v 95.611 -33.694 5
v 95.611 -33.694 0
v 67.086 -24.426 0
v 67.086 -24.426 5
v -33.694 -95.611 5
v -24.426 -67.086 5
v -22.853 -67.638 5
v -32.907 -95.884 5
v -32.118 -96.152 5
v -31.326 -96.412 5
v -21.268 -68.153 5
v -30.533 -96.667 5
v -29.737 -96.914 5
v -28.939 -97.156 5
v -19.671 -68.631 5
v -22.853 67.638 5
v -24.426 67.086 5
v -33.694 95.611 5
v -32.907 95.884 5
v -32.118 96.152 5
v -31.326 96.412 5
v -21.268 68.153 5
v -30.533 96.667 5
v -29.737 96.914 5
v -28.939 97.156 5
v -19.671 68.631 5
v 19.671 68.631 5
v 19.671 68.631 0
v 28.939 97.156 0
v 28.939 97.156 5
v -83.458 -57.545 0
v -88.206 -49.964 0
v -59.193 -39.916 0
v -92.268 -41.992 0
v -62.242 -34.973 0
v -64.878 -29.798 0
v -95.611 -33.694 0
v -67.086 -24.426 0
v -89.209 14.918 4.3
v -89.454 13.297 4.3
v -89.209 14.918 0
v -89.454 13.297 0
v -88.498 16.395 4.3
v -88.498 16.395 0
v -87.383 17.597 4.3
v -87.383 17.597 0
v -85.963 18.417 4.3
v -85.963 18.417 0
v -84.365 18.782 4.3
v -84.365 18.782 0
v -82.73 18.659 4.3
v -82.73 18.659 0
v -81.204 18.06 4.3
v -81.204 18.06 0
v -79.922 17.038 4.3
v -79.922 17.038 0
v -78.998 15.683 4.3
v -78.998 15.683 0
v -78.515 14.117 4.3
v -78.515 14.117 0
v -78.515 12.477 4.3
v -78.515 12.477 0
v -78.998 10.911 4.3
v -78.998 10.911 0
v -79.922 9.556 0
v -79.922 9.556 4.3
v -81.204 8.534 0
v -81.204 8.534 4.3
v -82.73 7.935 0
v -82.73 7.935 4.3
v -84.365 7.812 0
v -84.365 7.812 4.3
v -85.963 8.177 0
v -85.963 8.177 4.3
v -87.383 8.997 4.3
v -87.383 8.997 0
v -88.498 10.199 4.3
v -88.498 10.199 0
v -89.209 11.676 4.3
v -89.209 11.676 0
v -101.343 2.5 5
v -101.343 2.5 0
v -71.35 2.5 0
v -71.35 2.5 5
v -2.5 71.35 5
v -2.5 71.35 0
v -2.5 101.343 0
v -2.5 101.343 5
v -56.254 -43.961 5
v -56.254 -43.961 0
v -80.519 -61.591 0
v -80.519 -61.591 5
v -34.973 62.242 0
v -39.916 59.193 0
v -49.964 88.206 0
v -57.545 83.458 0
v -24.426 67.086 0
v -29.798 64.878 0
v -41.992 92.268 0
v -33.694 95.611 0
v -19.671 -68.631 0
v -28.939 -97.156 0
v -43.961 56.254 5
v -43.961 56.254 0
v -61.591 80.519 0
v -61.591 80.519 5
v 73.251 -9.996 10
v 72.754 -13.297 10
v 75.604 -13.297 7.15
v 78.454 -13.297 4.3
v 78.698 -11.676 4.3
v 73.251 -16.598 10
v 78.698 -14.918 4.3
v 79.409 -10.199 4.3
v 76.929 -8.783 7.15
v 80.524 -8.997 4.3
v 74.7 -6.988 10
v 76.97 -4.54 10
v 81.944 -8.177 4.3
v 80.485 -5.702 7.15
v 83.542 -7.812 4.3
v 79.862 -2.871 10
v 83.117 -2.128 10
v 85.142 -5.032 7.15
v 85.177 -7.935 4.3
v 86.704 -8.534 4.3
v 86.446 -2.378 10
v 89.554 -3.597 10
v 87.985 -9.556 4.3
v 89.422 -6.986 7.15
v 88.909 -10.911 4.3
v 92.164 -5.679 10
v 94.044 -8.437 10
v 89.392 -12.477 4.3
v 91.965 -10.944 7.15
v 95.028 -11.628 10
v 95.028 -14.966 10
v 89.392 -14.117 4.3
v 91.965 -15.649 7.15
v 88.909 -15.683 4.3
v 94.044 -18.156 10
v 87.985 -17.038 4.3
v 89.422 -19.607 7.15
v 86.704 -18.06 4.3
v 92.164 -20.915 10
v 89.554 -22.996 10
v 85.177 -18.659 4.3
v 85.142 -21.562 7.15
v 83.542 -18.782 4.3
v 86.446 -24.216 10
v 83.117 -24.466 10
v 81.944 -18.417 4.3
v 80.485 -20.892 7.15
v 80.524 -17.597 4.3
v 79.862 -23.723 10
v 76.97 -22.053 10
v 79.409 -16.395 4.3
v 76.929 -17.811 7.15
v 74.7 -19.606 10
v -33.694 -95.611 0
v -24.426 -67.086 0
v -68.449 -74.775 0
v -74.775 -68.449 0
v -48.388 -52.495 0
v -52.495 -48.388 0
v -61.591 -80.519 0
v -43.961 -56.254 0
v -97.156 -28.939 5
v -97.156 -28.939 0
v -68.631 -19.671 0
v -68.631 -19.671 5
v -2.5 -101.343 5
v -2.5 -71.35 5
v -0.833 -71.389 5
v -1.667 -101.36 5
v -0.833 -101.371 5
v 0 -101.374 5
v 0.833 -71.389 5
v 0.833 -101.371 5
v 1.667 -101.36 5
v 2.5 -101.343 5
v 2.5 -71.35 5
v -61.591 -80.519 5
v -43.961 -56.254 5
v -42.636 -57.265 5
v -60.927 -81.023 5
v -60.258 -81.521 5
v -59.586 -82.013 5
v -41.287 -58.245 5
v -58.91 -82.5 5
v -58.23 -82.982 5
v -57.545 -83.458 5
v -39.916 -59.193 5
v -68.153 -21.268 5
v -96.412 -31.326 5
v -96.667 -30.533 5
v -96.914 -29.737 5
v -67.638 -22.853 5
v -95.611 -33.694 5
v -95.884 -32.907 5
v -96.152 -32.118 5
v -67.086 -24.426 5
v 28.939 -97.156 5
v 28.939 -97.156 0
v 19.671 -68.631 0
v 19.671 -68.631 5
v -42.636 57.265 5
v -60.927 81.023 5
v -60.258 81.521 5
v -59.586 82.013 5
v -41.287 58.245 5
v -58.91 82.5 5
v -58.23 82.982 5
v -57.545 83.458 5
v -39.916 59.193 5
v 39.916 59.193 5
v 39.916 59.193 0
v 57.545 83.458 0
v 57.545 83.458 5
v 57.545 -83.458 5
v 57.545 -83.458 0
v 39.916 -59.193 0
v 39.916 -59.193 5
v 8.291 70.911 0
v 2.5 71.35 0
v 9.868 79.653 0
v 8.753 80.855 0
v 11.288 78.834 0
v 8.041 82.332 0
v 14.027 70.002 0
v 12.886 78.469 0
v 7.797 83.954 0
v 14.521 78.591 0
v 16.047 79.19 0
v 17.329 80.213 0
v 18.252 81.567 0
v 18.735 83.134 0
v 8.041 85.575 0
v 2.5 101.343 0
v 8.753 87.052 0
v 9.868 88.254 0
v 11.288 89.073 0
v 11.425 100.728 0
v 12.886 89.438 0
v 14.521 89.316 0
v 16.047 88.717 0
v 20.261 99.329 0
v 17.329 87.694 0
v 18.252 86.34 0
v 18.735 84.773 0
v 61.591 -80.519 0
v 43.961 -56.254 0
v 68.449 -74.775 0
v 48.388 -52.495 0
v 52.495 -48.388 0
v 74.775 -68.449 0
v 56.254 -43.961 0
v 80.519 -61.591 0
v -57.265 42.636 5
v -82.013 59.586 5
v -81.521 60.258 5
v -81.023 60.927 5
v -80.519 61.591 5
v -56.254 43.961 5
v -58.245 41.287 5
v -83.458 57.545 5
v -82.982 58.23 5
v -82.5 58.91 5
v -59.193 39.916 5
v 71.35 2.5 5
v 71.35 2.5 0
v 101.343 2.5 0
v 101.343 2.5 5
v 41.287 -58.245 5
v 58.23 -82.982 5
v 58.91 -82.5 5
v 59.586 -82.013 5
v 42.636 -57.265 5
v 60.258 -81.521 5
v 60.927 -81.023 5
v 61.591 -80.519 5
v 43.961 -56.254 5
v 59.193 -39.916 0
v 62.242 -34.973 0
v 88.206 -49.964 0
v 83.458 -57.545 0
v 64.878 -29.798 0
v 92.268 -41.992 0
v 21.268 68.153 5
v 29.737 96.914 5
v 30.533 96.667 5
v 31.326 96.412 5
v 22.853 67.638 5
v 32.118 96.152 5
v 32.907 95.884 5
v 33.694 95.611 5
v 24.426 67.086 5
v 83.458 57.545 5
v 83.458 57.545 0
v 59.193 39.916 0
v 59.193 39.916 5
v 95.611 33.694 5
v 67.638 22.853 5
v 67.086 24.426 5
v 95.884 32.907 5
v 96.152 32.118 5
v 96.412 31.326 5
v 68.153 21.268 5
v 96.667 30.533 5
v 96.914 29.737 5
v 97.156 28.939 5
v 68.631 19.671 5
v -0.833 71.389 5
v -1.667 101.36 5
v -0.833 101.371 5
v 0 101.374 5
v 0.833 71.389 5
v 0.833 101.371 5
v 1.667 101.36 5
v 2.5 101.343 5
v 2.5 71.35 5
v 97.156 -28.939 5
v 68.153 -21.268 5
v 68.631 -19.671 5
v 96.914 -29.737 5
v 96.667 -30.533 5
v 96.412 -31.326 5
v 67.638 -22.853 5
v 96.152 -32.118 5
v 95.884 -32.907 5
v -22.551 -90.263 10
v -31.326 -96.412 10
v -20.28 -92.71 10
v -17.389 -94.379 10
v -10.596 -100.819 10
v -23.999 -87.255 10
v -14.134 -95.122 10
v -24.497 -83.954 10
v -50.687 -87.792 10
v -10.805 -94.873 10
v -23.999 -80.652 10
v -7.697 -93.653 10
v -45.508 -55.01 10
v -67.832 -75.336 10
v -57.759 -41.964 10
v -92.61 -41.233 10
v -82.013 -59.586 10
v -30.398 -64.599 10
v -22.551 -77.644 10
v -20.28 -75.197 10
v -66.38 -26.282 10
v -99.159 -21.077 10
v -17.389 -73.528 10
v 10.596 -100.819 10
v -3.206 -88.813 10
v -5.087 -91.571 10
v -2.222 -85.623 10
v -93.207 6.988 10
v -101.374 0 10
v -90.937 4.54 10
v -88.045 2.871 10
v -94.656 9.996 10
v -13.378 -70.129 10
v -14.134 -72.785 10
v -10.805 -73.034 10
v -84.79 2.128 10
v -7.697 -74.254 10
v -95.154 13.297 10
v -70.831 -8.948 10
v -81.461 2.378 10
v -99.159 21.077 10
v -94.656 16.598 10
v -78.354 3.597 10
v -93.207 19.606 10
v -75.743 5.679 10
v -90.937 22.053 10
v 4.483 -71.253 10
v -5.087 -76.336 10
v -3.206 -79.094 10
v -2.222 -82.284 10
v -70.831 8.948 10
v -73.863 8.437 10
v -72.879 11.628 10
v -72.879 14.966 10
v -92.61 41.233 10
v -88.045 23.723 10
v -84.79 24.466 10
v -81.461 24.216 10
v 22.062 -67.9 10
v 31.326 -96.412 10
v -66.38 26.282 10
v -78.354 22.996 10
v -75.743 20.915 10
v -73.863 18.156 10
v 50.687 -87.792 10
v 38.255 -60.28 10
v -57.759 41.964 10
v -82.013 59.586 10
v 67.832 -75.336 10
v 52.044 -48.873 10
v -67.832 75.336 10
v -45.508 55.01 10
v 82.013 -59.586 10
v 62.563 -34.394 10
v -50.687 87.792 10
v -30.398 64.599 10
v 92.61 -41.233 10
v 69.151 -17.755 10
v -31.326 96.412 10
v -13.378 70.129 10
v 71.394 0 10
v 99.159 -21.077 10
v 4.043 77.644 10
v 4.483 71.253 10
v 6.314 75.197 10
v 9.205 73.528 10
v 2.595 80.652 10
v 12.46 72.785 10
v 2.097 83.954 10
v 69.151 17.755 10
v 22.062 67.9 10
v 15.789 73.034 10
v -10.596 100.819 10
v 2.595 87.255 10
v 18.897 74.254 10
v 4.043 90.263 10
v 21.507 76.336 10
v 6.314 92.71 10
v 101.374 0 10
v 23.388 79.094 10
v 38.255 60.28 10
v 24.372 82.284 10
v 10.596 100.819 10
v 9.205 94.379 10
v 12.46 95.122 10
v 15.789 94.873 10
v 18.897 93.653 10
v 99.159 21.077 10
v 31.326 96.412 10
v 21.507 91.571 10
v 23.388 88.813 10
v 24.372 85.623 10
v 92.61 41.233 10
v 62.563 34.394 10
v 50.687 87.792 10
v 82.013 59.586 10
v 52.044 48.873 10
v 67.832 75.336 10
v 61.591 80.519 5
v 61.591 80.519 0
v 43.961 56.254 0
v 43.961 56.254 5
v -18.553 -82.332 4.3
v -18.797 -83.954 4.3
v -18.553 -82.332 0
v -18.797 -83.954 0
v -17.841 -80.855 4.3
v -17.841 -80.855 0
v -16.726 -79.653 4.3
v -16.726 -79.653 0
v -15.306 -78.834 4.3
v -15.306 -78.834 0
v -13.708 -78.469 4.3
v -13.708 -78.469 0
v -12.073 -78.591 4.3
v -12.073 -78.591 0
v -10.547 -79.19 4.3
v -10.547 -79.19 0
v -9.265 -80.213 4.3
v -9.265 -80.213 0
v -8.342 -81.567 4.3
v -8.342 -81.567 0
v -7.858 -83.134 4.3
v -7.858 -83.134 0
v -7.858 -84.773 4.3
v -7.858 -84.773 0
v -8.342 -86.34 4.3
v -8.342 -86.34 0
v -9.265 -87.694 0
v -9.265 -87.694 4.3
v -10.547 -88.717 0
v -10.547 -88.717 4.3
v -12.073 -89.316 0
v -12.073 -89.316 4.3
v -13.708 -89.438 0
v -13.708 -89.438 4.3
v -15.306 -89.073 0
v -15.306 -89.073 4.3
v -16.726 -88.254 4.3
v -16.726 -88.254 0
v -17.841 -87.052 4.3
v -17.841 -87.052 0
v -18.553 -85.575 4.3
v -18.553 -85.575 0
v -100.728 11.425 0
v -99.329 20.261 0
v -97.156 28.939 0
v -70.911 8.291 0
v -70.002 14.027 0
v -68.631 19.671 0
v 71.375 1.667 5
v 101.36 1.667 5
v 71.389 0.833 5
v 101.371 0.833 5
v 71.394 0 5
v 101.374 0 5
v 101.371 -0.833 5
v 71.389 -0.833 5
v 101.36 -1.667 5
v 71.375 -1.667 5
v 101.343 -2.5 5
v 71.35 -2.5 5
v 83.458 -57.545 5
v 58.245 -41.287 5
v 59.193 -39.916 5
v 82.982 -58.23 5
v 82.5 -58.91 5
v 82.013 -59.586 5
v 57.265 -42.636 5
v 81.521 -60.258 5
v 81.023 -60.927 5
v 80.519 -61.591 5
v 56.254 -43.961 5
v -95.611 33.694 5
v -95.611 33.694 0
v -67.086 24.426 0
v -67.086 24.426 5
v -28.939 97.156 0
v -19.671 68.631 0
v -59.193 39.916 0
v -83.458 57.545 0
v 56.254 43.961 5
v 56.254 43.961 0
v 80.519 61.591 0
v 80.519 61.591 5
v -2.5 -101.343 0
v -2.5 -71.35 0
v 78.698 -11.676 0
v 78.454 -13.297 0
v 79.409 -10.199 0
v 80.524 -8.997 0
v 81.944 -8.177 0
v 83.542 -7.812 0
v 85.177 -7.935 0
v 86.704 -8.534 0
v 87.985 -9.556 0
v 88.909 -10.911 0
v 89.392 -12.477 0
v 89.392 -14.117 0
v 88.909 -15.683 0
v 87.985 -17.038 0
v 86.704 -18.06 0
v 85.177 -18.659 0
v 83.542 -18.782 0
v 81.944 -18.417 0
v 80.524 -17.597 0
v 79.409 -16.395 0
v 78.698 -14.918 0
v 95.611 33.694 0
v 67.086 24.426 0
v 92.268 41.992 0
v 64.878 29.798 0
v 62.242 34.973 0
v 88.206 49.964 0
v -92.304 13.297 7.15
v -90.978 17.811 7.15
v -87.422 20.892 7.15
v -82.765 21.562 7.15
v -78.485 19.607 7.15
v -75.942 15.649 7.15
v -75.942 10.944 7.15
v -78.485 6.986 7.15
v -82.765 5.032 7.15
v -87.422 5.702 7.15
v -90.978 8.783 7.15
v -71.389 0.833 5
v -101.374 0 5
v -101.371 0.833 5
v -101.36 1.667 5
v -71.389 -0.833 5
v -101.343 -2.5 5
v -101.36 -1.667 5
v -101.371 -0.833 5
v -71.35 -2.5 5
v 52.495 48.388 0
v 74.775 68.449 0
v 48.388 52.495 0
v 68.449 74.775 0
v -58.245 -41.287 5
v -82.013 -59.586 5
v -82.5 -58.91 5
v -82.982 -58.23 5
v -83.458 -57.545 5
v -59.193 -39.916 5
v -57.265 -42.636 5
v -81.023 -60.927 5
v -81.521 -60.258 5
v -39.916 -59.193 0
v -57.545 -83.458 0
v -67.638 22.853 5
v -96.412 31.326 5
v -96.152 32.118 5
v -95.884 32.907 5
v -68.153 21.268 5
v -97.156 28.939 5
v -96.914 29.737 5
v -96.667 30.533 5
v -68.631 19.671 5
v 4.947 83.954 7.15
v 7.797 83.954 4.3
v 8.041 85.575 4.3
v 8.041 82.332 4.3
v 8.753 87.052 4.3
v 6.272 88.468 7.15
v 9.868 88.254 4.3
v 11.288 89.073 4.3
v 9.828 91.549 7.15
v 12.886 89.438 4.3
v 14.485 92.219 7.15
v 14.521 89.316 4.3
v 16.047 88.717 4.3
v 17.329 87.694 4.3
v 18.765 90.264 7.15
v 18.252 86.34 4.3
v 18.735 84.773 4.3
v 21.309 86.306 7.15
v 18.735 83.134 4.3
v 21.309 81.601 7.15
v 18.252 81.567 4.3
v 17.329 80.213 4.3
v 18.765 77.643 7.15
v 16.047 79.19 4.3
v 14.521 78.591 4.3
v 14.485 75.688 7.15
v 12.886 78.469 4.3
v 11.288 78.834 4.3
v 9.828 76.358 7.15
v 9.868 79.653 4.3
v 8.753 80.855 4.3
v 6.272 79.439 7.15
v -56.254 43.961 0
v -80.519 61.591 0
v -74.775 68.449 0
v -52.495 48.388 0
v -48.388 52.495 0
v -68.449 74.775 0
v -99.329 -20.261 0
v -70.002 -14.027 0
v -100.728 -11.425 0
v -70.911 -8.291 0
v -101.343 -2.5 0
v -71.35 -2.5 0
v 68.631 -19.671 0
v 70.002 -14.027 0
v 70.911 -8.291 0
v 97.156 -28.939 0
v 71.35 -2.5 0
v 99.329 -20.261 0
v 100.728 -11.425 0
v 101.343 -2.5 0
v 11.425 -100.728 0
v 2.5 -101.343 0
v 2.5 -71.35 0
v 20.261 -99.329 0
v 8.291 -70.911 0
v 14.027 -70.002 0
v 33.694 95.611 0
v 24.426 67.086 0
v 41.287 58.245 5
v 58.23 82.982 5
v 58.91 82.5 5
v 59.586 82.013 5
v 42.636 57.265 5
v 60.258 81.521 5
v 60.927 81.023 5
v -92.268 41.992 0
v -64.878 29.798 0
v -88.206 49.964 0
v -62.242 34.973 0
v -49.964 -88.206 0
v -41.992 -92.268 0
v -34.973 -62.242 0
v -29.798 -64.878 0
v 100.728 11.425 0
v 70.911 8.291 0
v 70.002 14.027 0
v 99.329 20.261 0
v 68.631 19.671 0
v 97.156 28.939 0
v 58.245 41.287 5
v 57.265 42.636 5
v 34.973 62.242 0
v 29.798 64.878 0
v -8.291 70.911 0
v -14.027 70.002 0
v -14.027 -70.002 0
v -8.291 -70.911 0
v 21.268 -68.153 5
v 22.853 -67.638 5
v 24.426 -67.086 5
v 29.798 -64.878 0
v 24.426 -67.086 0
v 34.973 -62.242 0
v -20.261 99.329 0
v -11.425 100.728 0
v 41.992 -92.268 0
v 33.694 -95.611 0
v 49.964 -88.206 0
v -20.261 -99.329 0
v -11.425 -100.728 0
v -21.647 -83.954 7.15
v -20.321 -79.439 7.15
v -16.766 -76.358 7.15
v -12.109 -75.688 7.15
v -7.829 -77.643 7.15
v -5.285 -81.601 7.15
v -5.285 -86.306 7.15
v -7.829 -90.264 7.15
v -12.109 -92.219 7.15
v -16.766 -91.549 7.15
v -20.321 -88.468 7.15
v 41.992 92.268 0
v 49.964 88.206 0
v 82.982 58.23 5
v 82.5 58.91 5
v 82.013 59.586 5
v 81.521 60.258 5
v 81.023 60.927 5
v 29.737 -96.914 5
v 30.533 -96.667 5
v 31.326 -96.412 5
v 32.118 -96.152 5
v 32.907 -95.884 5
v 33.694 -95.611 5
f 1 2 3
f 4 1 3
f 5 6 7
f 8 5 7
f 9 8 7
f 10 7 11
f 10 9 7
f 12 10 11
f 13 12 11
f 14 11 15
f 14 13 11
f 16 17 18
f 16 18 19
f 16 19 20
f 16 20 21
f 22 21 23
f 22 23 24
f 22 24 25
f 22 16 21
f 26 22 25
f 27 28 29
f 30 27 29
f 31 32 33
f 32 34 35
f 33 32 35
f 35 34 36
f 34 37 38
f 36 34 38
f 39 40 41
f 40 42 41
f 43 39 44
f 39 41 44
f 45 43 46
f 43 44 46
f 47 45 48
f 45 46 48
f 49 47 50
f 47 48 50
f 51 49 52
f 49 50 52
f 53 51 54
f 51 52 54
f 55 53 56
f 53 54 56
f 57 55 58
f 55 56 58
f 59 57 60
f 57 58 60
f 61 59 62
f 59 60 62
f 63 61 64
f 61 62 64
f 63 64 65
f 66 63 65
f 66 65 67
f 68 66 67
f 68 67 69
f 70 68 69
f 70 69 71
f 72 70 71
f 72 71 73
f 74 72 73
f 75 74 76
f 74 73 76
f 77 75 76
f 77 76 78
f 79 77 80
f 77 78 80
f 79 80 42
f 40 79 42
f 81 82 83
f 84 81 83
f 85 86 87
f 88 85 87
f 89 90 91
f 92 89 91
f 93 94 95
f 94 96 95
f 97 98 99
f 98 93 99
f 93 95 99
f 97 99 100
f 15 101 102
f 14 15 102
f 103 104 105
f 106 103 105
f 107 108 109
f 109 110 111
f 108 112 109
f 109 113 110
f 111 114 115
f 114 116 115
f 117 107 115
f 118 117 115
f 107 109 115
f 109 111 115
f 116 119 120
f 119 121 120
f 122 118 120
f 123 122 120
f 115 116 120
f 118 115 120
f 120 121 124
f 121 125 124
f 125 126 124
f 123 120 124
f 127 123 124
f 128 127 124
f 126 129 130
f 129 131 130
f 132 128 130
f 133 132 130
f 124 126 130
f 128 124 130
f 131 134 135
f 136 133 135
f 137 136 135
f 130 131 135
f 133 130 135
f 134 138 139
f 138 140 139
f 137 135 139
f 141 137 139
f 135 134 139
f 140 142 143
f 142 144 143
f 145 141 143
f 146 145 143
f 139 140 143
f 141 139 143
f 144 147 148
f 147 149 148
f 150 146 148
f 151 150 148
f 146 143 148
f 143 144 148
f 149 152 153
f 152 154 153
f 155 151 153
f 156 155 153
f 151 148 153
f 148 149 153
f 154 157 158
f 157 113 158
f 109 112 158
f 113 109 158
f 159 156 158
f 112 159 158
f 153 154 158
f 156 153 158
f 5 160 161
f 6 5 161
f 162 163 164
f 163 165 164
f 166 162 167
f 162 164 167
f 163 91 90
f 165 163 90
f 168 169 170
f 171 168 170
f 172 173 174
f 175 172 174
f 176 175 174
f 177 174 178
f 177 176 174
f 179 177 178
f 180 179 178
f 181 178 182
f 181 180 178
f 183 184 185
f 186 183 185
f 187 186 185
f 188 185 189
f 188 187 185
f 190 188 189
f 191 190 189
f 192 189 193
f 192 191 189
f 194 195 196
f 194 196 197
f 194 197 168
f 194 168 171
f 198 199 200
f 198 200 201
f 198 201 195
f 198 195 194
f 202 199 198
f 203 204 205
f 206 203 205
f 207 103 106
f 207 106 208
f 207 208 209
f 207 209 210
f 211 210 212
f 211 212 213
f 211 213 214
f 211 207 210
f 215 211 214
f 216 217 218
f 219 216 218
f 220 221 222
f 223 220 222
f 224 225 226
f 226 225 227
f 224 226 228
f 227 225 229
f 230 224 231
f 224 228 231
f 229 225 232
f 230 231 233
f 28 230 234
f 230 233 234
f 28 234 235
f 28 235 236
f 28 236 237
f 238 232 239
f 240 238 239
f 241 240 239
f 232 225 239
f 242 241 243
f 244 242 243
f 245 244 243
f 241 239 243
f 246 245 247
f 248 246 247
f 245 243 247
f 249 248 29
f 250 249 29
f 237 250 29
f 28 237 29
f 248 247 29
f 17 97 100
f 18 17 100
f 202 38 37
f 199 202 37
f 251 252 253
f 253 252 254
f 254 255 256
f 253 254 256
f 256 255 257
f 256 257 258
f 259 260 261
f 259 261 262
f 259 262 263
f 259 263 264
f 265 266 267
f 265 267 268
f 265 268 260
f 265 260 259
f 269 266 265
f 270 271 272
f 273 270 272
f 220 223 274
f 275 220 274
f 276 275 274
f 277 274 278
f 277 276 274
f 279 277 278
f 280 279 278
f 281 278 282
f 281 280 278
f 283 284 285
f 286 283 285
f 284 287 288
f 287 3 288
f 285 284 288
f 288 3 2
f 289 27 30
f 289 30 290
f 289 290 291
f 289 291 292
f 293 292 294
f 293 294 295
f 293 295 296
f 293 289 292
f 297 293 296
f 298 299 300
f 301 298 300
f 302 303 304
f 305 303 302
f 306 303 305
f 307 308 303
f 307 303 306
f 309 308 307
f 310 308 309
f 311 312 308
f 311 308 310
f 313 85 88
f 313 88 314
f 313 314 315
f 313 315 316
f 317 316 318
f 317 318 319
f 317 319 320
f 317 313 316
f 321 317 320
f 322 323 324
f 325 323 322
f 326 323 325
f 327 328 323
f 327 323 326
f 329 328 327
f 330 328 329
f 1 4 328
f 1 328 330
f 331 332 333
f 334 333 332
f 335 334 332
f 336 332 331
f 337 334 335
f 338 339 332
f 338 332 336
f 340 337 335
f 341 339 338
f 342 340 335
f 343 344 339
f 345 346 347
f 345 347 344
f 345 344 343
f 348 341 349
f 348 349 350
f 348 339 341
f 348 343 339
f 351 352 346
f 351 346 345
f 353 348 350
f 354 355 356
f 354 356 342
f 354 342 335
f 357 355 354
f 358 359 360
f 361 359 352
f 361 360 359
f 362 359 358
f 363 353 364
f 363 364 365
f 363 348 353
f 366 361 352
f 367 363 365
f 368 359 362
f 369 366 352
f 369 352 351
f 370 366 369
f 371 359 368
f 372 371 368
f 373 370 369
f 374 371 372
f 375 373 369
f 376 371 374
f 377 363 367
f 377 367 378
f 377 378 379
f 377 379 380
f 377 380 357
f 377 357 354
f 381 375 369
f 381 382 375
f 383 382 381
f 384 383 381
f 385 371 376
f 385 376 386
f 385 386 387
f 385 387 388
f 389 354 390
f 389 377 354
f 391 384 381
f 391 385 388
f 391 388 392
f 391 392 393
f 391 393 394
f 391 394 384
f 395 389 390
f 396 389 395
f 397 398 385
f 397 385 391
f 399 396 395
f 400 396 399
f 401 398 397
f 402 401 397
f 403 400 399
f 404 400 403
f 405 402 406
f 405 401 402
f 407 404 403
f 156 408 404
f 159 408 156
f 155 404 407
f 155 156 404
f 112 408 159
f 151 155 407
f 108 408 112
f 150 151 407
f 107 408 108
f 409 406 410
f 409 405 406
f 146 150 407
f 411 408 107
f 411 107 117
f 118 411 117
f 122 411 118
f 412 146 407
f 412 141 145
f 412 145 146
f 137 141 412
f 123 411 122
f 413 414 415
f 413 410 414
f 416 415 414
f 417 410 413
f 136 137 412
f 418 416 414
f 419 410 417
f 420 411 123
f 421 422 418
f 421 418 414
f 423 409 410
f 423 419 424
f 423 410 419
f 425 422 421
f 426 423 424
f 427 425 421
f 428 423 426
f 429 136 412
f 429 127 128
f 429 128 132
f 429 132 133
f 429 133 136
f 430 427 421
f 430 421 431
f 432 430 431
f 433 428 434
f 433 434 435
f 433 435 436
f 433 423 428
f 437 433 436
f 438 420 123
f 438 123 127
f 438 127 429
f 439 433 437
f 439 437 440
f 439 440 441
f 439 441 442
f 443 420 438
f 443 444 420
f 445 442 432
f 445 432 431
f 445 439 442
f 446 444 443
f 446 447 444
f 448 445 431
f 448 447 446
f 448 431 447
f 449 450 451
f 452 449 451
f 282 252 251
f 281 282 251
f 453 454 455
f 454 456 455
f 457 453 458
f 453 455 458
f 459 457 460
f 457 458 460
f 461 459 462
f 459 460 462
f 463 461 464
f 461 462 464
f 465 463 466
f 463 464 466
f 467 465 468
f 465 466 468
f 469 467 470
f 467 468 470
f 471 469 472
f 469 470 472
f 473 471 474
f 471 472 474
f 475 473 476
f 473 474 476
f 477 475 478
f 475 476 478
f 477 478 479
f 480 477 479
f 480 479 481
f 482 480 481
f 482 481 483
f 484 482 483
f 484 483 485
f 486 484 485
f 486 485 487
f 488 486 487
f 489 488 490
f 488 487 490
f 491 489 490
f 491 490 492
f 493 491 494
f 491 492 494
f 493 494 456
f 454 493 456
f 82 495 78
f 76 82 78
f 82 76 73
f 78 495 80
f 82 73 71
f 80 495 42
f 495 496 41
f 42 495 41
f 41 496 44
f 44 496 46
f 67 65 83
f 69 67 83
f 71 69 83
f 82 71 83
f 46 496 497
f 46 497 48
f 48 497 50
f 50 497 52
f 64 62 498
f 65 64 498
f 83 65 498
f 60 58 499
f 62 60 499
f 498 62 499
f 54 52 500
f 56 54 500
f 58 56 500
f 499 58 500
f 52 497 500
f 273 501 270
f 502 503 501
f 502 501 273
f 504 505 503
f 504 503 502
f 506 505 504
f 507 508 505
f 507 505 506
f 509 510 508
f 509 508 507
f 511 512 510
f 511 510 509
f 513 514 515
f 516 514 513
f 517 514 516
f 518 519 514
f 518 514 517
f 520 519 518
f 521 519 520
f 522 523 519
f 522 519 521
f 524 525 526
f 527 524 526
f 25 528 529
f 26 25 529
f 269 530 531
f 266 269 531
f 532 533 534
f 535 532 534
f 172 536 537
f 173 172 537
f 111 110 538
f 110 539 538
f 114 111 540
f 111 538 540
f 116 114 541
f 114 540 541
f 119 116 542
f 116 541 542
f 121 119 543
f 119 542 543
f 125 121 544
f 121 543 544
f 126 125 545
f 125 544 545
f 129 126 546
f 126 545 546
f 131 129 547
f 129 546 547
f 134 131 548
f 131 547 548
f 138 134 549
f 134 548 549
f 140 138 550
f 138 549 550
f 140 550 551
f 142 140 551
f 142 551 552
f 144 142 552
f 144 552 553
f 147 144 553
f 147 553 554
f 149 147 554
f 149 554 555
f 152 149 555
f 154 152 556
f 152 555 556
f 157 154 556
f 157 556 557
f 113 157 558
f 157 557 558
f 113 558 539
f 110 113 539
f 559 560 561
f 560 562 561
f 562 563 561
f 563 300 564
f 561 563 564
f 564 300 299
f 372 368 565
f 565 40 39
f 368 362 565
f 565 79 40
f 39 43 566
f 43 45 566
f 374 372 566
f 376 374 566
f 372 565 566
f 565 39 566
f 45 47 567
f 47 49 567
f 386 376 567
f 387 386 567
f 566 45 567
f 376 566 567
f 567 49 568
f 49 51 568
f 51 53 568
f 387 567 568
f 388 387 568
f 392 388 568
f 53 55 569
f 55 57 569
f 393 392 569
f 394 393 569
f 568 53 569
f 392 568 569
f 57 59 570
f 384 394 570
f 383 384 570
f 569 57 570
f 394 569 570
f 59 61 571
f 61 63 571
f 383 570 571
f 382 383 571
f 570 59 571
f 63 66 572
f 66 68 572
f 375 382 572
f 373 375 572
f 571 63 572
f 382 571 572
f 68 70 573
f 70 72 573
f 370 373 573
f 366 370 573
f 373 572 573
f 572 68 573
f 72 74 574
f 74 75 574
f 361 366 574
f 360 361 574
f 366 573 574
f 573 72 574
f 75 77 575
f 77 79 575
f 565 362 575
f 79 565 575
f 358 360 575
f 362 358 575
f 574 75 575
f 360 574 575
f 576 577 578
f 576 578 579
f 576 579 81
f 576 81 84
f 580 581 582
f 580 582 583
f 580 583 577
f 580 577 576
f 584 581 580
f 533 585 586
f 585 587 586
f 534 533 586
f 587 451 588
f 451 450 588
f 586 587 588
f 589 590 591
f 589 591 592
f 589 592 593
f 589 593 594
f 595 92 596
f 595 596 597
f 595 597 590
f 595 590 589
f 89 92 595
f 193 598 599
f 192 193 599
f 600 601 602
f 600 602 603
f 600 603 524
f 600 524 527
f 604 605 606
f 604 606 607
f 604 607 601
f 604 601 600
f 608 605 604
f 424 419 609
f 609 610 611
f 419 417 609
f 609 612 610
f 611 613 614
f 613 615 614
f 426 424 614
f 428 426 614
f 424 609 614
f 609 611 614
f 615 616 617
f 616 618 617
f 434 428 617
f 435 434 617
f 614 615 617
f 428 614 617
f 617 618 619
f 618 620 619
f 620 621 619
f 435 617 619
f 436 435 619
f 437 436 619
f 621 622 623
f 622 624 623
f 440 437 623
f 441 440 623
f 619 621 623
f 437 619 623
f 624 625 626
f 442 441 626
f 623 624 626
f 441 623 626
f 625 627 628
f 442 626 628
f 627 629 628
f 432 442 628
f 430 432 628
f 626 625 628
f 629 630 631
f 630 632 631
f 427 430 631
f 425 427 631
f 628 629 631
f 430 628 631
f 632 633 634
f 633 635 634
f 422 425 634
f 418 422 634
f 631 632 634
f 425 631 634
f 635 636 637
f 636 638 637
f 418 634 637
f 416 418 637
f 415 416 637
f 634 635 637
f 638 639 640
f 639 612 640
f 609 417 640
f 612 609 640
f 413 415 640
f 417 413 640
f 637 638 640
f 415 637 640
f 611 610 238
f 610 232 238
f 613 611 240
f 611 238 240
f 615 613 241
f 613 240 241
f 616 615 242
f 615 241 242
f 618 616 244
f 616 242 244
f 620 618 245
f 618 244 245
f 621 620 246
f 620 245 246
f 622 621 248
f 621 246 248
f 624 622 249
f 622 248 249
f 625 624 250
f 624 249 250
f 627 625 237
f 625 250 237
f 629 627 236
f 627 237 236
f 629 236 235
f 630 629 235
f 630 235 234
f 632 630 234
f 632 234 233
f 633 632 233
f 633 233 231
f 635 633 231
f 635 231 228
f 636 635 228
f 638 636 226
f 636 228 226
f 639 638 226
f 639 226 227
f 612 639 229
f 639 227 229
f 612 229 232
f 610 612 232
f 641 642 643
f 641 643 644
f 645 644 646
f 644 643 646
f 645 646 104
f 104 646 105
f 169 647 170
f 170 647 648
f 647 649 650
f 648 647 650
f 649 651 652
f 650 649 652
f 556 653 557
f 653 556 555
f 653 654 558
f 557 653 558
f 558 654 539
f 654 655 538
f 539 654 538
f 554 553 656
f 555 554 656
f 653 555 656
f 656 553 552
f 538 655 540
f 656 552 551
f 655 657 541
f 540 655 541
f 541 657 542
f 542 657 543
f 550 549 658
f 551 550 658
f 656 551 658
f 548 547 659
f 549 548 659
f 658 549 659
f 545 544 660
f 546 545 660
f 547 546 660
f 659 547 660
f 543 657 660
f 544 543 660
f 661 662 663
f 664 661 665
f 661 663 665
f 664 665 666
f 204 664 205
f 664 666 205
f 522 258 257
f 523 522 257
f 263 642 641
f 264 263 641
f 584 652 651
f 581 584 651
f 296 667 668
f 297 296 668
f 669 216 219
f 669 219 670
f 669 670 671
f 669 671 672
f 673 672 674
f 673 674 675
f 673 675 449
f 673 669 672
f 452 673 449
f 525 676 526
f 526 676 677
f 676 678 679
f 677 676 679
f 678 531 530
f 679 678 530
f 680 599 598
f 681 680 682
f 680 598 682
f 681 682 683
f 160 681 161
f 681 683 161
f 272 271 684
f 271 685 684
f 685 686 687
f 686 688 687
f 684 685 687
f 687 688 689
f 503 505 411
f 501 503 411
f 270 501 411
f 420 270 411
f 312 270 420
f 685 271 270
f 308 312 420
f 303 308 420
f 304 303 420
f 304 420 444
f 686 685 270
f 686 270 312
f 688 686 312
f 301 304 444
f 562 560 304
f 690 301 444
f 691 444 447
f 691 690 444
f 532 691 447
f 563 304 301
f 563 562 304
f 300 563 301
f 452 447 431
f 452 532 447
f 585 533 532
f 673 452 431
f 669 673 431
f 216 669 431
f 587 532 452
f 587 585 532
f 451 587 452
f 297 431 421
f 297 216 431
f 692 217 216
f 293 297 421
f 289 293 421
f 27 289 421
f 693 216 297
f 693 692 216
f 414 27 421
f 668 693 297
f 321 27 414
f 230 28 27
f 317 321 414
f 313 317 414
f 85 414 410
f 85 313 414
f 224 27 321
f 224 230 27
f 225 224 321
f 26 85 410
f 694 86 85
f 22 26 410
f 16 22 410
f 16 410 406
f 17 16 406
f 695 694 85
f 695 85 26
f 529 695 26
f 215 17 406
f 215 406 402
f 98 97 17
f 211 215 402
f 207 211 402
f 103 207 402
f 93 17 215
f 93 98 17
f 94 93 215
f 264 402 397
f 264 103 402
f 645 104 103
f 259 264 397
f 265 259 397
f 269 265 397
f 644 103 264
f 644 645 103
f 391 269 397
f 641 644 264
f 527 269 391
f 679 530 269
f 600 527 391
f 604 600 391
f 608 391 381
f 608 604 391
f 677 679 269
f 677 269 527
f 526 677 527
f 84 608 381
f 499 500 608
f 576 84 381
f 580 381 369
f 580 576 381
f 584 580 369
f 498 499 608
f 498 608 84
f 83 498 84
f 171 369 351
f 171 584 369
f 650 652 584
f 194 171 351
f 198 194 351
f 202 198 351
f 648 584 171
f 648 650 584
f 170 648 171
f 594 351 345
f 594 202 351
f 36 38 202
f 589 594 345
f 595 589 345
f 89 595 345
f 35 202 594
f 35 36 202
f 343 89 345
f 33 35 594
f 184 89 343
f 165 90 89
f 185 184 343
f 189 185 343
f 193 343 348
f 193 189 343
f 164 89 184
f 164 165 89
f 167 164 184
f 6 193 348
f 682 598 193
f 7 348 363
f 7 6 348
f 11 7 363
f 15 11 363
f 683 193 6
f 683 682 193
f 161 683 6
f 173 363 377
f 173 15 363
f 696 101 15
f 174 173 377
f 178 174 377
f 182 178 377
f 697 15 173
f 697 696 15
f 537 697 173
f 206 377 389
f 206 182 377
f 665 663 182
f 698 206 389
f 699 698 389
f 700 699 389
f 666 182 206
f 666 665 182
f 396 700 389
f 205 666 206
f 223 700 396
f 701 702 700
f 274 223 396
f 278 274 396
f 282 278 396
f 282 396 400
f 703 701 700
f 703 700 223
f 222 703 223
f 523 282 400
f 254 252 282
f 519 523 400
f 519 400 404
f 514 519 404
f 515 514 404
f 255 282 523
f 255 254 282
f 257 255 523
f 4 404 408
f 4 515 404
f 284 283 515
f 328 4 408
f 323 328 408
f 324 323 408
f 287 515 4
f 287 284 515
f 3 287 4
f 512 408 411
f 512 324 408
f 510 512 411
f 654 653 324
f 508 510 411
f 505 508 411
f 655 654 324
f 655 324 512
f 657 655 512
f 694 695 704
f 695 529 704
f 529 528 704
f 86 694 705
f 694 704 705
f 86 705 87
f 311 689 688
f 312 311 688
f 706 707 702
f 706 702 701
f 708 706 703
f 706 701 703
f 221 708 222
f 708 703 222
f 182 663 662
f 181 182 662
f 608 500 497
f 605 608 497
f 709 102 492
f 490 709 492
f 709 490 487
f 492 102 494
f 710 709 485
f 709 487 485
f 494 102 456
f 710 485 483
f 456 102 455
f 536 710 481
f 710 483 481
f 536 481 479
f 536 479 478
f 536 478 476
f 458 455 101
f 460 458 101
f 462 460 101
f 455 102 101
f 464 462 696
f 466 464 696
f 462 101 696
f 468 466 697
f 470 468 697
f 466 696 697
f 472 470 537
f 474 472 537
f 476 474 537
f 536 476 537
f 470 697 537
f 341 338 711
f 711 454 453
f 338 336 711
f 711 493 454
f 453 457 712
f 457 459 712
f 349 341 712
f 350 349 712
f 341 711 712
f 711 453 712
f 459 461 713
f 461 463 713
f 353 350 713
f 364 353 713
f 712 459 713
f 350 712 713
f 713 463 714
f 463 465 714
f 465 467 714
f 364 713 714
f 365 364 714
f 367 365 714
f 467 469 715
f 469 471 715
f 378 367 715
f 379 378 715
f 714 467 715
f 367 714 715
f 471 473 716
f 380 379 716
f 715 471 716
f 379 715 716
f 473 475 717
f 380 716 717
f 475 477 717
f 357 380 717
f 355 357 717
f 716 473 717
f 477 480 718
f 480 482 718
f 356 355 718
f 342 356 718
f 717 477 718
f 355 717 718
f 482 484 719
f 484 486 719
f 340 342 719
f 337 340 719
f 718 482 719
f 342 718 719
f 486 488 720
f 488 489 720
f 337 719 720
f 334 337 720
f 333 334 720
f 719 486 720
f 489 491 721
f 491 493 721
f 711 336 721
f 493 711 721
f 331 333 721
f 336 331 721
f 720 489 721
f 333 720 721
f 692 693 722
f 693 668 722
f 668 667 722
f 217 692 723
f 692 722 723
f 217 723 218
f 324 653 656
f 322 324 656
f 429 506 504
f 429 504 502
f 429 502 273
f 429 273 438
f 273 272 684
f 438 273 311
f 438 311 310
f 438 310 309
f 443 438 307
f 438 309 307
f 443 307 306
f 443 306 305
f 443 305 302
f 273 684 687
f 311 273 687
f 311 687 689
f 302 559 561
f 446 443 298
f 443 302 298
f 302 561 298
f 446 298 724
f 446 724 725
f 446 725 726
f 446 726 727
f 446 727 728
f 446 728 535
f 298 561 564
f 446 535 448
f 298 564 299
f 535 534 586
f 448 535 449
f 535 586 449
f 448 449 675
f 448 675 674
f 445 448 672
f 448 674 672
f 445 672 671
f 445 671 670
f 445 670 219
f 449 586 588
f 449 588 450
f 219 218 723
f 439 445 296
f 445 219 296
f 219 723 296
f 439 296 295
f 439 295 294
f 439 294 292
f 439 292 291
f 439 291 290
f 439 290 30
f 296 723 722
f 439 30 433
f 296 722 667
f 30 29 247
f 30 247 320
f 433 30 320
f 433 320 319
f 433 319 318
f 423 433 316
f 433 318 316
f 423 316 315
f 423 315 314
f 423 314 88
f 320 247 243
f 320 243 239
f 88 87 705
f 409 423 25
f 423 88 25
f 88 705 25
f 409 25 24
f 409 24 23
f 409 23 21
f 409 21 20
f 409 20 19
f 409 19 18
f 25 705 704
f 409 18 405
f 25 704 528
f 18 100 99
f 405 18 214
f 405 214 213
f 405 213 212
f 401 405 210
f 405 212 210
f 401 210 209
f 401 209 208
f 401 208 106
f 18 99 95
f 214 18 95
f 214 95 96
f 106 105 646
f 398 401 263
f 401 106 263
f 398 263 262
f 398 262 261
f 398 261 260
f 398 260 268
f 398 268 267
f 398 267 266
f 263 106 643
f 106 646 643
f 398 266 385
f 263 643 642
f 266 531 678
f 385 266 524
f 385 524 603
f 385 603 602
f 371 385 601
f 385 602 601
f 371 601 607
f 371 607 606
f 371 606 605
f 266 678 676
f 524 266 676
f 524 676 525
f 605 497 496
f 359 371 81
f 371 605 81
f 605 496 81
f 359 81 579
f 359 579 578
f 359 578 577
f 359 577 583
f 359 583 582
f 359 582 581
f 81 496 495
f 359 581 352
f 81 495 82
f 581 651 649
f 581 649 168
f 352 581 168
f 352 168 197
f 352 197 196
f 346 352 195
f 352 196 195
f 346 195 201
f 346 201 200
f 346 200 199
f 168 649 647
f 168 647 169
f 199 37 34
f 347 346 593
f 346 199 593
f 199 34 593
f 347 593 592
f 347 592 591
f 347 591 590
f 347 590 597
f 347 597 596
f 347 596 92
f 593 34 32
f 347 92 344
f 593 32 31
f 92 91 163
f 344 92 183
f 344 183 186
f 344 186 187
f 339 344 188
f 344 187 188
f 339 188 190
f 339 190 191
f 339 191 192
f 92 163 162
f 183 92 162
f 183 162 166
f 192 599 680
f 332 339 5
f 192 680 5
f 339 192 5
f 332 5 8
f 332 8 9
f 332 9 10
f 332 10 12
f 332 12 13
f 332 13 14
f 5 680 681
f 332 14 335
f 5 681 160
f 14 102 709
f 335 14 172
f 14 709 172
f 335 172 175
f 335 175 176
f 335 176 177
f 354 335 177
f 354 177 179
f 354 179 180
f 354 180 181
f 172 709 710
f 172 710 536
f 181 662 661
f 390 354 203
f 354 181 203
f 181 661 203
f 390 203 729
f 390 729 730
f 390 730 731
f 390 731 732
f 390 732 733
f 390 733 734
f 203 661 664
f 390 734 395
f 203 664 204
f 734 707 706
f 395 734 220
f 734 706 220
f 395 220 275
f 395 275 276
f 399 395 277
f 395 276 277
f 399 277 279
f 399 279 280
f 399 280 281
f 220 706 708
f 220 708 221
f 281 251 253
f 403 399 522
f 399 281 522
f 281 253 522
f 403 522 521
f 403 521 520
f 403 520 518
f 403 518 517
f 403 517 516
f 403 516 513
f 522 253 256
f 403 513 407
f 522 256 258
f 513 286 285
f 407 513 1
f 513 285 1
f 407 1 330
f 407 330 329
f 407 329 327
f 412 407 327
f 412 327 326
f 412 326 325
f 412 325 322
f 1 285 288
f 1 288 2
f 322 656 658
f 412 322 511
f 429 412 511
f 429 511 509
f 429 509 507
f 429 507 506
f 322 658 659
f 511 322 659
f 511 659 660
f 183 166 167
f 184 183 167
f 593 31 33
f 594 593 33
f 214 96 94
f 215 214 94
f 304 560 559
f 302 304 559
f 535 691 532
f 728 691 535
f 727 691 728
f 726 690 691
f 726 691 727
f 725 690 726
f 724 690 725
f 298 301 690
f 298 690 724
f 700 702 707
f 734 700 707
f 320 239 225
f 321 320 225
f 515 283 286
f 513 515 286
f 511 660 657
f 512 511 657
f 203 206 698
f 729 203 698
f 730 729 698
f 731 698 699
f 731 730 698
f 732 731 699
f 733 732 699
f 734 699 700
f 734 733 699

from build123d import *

# Parameters (mm, degrees)
F0_R           = 101.374
F0_R_2         = 71.394
F1_DEPTH       = 10
F3_DEPTH       = 5
F5_D           = 11
F5_CSINK_D     = 22.4
F5_CSINK_ANGLE = 90


with BuildPart() as f1:
    # F0 (on Top) → F1 (new body)
    with BuildSketch(Plane.XY):
        Circle(F0_R)
        Circle(F0_R_2, mode=Mode.SUBTRACT)
    extrude(amount=F1_DEPTH)

    # F2 (on face) → F3 (cut)
    with BuildSketch(Plane(origin=(0, 0, 0), x_dir=(1, 0, 0), z_dir=(0, 0, -1))):
        with BuildLine():
            ThreePointArc((2.5, 101.343168867), (1.2500950523, 101.3662919237), (0, 101.374))
            ThreePointArc((0, 101.374), (-1.2500950523, 101.3662919237), (-2.5, 101.343168867))
            Line((-2.5, 101.343168867), (-2.5, 71.3502153886))
            ThreePointArc((-2.5, 71.3502153886), (0, 71.394), (2.5, 71.3502153886))
            Line((2.5, 71.3502153886), (2.5, 101.343168867))
        make_face()
        with BuildLine():
            ThreePointArc((31.3262879268, 96.4124035626), (30.1349953836, 96.791373217), (28.939120153, 97.1556236189))
            Line((28.939120153, 97.1556236189), (19.6707878167, 68.6306297703))
            ThreePointArc((19.6707878167, 68.6306297703), (22.0619592964, 67.8997289244), (24.4260703981, 67.0855447985))
            Line((24.4260703981, 67.0855447985), (33.6944027344, 95.610538647))
            ThreePointArc((33.6944027344, 95.610538647), (32.5128174779, 96.0187719961), (31.3262879268, 96.4124035626))
        make_face()
        with BuildLine():
            Line((57.5454775947, 83.4578090079), (39.9160618674, 59.1929999324))
            ThreePointArc((39.9160618674, 59.1929999324), (41.9643403022, 57.7589592964), (43.9611468392, 56.254073671))
            Line((43.9611468392, 56.254073671), (61.5905625665, 80.5188827465))
            ThreePointArc((61.5905625665, 80.5188827465), (60.592959405, 81.2722655433), (59.5861417437, 82.0132890945))
            ThreePointArc((59.5861417437, 82.0132890945), (58.5702631175, 82.7418404095), (57.5454775947, 83.4578090079))
        make_face()
        with BuildLine():
            Line((80.5188827465, 61.5905625665), (56.254073671, 43.9611468392))
            ThreePointArc((56.254073671, 43.9611468392), (57.7589592964, 41.9643403022), (59.1929999324, 39.9160618674))
            Line((59.1929999324, 39.9160618674), (83.4578090079, 57.5454775947))
            ThreePointArc((83.4578090079, 57.5454775947), (82.7418395043, 58.5702643962), (82.0132872528, 59.5861442786))
            ThreePointArc((82.0132872528, 59.5861442786), (81.2722646069, 60.592960661), (80.5188827465, 61.5905625665))
        make_face()
        with BuildLine():
            Line((95.610538647, 33.6944027344), (67.0855447985, 24.4260703981))
            ThreePointArc((67.0855447985, 24.4260703981), (67.8997289244, 22.0619592964), (68.6306297703, 19.6707878167))
            Line((68.6306297703, 19.6707878167), (97.1556236189, 28.939120153))
            ThreePointArc((97.1556236189, 28.939120153), (96.7913734751, 30.1349945547), (96.4124040992, 31.3262862756))
            ThreePointArc((96.4124040992, 31.3262862756), (96.0187722746, 32.5128166557), (95.610538647, 33.6944027344))
        make_face()
        with BuildLine():
            Line((101.343168867, 2.5), (71.3502153886, 2.5))
            ThreePointArc((71.3502153886, 2.5), (71.3830530079, 1.2501916945), (71.394, 0))
            ThreePointArc((71.394, 0), (71.3830530079, -1.2501916945), (71.3502153886, -2.5))
            Line((71.3502153886, -2.5), (101.343168867, -2.5))
            ThreePointArc((101.343168867, -2.5), (101.3662919237, -1.2500950523), (101.374, 0))
            ThreePointArc((101.374, 0), (101.3662919237, 1.2500950523), (101.343168867, 2.5))
        make_face()
        with BuildLine():
            Line((97.1556236189, -28.939120153), (68.6306297703, -19.6707878167))
            ThreePointArc((68.6306297703, -19.6707878167), (67.8997289244, -22.0619592964), (67.0855447985, -24.4260703981))
            Line((67.0855447985, -24.4260703981), (95.610538647, -33.6944027344))
            ThreePointArc((95.610538647, -33.6944027344), (96.0187719961, -32.5128174779), (96.4124035626, -31.3262879268))
            ThreePointArc((96.4124035626, -31.3262879268), (96.791373217, -30.1349953836), (97.1556236189, -28.939120153))
        make_face()
        with BuildLine():
            Line((83.4578090079, -57.5454775947), (59.1929999324, -39.9160618674))
            ThreePointArc((59.1929999324, -39.9160618674), (57.7589592964, -41.9643403022), (56.254073671, -43.9611468392))
            Line((56.254073671, -43.9611468392), (80.5188827465, -61.5905625665))
            ThreePointArc((80.5188827465, -61.5905625665), (81.2722651856, -60.5929598848), (82.013288391, -59.586142712))
            ThreePointArc((82.013288391, -59.586142712), (82.7418400637, -58.5702636059), (83.4578090079, -57.5454775947))
        make_face()
        with BuildLine():
            Line((61.5905625665, -80.5188827465), (43.9611468392, -56.254073671))
            ThreePointArc((43.9611468392, -56.254073671), (41.9643403022, -57.7589592964), (39.9160618674, -59.1929999324))
            Line((39.9160618674, -59.1929999324), (57.5454775947, -83.4578090079))
            ThreePointArc((57.5454775947, -83.4578090079), (58.5702643962, -82.7418395043), (59.5861442786, -82.0132872528))
            ThreePointArc((59.5861442786, -82.0132872528), (60.592960661, -81.2722646069), (61.5905625665, -80.5188827465))
        make_face()
        with BuildLine():
            Line((33.6944027344, -95.610538647), (24.4260703981, -67.0855447985))
            ThreePointArc((24.4260703981, -67.0855447985), (22.0619592964, -67.8997289244), (19.6707878167, -68.6306297703))
            Line((19.6707878167, -68.6306297703), (28.939120153, -97.1556236189))
            ThreePointArc((28.939120153, -97.1556236189), (30.1349953836, -96.791373217), (31.3262879268, -96.4124035626))
            ThreePointArc((31.3262879268, -96.4124035626), (32.5128174779, -96.0187719961), (33.6944027344, -95.610538647))
        make_face()
        with BuildLine():
            ThreePointArc((2.5, -71.3502153886), (0, -71.394), (-2.5, -71.3502153886))
            Line((-2.5, -71.3502153886), (-2.5, -101.343168867))
            ThreePointArc((-2.5, -101.343168867), (-1.2500950523, -101.3662919237), (0, -101.374))
            ThreePointArc((0, -101.374), (1.2500950523, -101.3662919237), (2.5, -101.343168867))
            Line((2.5, -101.343168867), (2.5, -71.3502153886))
        make_face()
        with BuildLine():
            ThreePointArc((-19.6707878167, -68.6306297703), (-22.0619592964, -67.8997289244), (-24.4260703981, -67.0855447985))
            Line((-24.4260703981, -67.0855447985), (-33.6944027344, -95.610538647))
            ThreePointArc((-33.6944027344, -95.610538647), (-32.5128191824, -96.018771419), (-31.3262913498, -96.4124024505))
            ThreePointArc((-31.3262913498, -96.4124024505), (-30.1349971018, -96.791372682), (-28.939120153, -97.1556236189))
            Line((-28.939120153, -97.1556236189), (-19.6707878167, -68.6306297703))
        make_face()
        with BuildLine():
            ThreePointArc((-39.9160618674, -59.1929999324), (-41.9643403022, -57.7589592964), (-43.9611468392, -56.254073671))
            Line((-43.9611468392, -56.254073671), (-61.5905625665, -80.5188827465))
            ThreePointArc((-61.5905625665, -80.5188827465), (-60.5929601813, -81.2722649646), (-59.5861433104, -82.0132879563))
            ThreePointArc((-59.5861433104, -82.0132879563), (-58.5702639078, -82.7418398501), (-57.5454775947, -83.4578090079))
            Line((-57.5454775947, -83.4578090079), (-39.9160618674, -59.1929999324))
        make_face()
        with BuildLine():
            ThreePointArc((-56.254073671, -43.9611468392), (-57.7589592964, -41.9643403022), (-59.1929999324, -39.9160618674))
            Line((-59.1929999324, -39.9160618674), (-83.4578090079, -57.5454775947))
            ThreePointArc((-83.4578090079, -57.5454775947), (-82.7418404095, -58.5702631175), (-82.0132890945, -59.5861417437))
            ThreePointArc((-82.0132890945, -59.5861417437), (-81.2722655433, -60.592959405), (-80.5188827465, -61.5905625665))
            Line((-80.5188827465, -61.5905625665), (-56.254073671, -43.9611468392))
        make_face()
        with BuildLine():
            ThreePointArc((-67.0855447985, -24.4260703981), (-67.8997289244, -22.0619592964), (-68.6306297703, -19.6707878167))
            Line((-68.6306297703, -19.6707878167), (-97.1556236189, -28.939120153))
            ThreePointArc((-97.1556236189, -28.939120153), (-96.791373217, -30.1349953836), (-96.4124035626, -31.3262879268))
            ThreePointArc((-96.4124035626, -31.3262879268), (-96.0187719961, -32.5128174779), (-95.610538647, -33.6944027344))
            Line((-95.610538647, -33.6944027344), (-67.0855447985, -24.4260703981))
        make_face()
        with BuildLine():
            ThreePointArc((-71.3502153886, -2.5), (-71.394, 0), (-71.3502153886, 2.5))
            Line((-71.3502153886, 2.5), (-101.343168867, 2.5))
            ThreePointArc((-101.343168867, 2.5), (-101.3662919237, 1.2500950523), (-101.374, 0))
            ThreePointArc((-101.374, 0), (-101.3662919237, -1.2500950523), (-101.343168867, -2.5))
            Line((-101.343168867, -2.5), (-71.3502153886, -2.5))
        make_face()
        with BuildLine():
            ThreePointArc((-68.6306297703, 19.6707878167), (-67.8997289244, 22.0619592964), (-67.0855447985, 24.4260703981))
            Line((-67.0855447985, 24.4260703981), (-95.610538647, 33.6944027344))
            ThreePointArc((-95.610538647, 33.6944027344), (-96.0187717709, 32.5128181431), (-96.4124031286, 31.3262892627))
            ThreePointArc((-96.4124031286, 31.3262892627), (-96.7913730082, 30.1349960542), (-97.1556236189, 28.939120153))
            Line((-97.1556236189, 28.939120153), (-68.6306297703, 19.6707878167))
        make_face()
        with BuildLine():
            ThreePointArc((-59.1929999324, 39.9160618674), (-57.7589592964, 41.9643403022), (-56.254073671, 43.9611468392))
            Line((-56.254073671, 43.9611468392), (-80.5188827465, 61.5905625665))
            ThreePointArc((-80.5188827465, 61.5905625665), (-81.272264828, 60.5929603645), (-82.0132876875, 59.5861436802))
            ThreePointArc((-82.0132876875, 59.5861436802), (-82.741839718, 58.5702640943), (-83.4578090079, 57.5454775947))
            Line((-83.4578090079, 57.5454775947), (-59.1929999324, 39.9160618674))
        make_face()
        with BuildLine():
            ThreePointArc((-43.9611468392, 56.254073671), (-41.9643403022, 57.7589592964), (-39.9160618674, 59.1929999324))
            Line((-39.9160618674, 59.1929999324), (-57.5454775947, 83.4578090079))
            ThreePointArc((-57.5454775947, 83.4578090079), (-58.5702643962, 82.7418395043), (-59.5861442786, 82.0132872528))
            ThreePointArc((-59.5861442786, 82.0132872528), (-60.592960661, 81.2722646069), (-61.5905625665, 80.5188827465))
            Line((-61.5905625665, 80.5188827465), (-43.9611468392, 56.254073671))
        make_face()
        with BuildLine():
            Line((-19.6707878167, 68.6306297703), (-28.939120153, 97.1556236189))
            ThreePointArc((-28.939120153, 97.1556236189), (-30.134995798, 96.791373088), (-31.3262887525, 96.4124032944))
            ThreePointArc((-31.3262887525, 96.4124032944), (-32.5128178891, 96.0187718569), (-33.6944027344, 95.610538647))
            Line((-33.6944027344, 95.610538647), (-24.4260703981, 67.0855447985))
            ThreePointArc((-24.4260703981, 67.0855447985), (-22.0619592964, 67.8997289244), (-19.6707878167, 68.6306297703))
        make_face()
    extrude(amount=-F3_DEPTH, mode=Mode.SUBTRACT)

    # F5 (through all)
    with Locations(Plane.XY.offset(10)):
        with Locations((13.2969295284, 83.9535089506), (83.9535089506, -13.2969295284), (-83.9535089506, 13.2969295284), (-13.2969295284, -83.9535089506)):
            CounterSinkHole(F5_D / 2, F5_CSINK_D / 2, counter_sink_angle=F5_CSINK_ANGLE)


solid = f1.part
